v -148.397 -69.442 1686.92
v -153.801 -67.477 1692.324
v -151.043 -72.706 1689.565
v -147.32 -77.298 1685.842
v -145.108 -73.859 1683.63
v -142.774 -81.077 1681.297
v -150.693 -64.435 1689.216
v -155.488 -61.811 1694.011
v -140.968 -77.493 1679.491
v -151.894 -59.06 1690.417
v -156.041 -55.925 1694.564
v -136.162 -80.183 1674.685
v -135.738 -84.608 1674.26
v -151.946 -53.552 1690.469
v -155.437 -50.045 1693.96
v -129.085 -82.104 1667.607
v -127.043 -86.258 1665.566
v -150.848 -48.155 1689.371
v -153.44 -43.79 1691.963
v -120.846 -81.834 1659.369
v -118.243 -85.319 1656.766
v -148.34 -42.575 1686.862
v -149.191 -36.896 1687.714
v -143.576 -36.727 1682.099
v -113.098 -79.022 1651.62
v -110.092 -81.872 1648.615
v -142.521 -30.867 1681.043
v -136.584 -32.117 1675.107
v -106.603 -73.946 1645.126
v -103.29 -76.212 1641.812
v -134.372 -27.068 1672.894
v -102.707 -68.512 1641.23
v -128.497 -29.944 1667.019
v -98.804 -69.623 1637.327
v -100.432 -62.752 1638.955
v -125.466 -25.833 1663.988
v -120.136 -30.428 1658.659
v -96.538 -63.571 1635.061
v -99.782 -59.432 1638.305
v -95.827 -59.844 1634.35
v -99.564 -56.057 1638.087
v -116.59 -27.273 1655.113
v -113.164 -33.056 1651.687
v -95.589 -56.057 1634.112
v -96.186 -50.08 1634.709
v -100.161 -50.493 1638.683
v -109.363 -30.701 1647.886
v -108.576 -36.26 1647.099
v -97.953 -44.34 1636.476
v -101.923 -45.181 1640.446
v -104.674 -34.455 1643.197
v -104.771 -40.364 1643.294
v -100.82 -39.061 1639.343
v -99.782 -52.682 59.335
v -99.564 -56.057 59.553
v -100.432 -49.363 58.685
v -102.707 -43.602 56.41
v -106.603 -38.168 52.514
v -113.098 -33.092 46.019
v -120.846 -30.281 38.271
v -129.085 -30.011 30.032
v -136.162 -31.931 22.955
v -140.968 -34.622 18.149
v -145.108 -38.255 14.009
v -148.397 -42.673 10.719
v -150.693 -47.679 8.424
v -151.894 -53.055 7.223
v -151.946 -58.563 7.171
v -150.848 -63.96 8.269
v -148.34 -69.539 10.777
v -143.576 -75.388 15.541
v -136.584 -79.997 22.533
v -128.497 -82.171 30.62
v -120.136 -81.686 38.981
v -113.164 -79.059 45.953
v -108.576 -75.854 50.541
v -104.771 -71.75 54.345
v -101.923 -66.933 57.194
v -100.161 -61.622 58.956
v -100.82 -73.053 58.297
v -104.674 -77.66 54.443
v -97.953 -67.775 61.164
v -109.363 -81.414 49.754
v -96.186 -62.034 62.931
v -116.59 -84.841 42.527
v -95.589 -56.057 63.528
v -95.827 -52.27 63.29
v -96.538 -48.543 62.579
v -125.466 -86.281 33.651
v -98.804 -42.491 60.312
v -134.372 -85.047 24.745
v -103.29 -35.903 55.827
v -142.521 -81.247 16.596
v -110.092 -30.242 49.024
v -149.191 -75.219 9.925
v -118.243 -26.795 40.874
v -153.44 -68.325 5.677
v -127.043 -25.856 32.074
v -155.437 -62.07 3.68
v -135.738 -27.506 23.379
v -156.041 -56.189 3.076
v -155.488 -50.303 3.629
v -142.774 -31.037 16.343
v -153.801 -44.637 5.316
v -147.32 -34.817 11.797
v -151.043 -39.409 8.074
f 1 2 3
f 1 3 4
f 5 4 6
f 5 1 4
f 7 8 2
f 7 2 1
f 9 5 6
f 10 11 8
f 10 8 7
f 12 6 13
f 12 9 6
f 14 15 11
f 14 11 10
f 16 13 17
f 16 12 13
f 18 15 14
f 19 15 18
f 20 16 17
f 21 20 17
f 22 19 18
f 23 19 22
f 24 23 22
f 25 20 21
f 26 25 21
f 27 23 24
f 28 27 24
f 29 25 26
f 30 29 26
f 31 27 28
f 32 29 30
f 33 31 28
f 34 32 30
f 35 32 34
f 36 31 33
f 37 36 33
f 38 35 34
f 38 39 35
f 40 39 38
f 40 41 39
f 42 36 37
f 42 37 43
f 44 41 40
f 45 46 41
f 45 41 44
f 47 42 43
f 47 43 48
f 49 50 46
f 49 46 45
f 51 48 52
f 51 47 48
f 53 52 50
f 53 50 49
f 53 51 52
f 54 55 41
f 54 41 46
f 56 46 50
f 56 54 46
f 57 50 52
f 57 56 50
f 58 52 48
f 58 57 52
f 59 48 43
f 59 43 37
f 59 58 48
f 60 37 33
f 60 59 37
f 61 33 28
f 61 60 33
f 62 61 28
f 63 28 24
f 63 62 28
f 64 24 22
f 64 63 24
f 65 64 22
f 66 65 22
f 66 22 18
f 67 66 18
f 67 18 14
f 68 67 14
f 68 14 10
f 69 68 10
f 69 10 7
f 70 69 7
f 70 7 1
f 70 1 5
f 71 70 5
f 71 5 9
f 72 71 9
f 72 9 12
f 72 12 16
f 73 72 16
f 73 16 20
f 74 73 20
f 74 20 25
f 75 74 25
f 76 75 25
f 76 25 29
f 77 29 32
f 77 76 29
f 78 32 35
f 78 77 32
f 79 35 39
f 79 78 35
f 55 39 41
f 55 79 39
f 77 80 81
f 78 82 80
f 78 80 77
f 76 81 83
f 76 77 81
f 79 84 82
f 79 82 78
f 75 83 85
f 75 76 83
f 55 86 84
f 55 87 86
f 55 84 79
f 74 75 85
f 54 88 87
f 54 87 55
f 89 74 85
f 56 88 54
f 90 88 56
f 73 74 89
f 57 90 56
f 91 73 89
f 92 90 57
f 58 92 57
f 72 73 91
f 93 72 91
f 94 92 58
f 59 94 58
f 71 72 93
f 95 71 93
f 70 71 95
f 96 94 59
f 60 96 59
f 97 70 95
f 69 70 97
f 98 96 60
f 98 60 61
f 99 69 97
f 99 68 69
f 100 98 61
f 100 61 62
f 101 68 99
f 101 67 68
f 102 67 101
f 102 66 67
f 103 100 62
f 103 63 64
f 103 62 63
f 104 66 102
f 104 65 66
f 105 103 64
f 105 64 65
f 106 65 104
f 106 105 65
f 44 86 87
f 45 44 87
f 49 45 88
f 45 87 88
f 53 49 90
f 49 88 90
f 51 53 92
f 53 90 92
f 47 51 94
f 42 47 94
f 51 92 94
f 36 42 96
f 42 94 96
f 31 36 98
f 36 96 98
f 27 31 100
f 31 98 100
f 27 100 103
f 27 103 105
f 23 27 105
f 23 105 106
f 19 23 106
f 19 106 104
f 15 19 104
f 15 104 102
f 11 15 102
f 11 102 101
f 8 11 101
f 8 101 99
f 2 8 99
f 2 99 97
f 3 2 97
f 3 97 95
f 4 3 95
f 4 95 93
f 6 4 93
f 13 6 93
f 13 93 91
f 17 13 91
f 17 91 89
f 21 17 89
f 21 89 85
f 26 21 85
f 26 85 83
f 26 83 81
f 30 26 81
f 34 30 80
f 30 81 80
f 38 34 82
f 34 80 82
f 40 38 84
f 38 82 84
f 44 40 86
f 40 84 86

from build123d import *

# Parameters (mm, degrees)
F0_R     = 30.226
F0_R_2   = 26.2509
F1_DEPTH = 1695.45
F3_DEPTH = 103.124
F5_DEPTH = 124.968


with BuildPart() as f1:
    # F0 (on Top) → F1 (new body)
    with BuildSketch(Plane.XY):
        with Locations((-125.815094, -56.057207)):
            Circle(F0_R)
        with Locations((-125.815094, -56.057207)):
            Circle(F0_R_2, mode=Mode.SUBTRACT)
    extrude(amount=F1_DEPTH)

    # F2 (on Front) → F3 (cut)
    with BuildSketch(Plane.XZ):
        Polygon((-89.987062, 69.129817), (-159.116879, 0), (-88.816114, 0), align=None)
    extrude(amount=F3_DEPTH, mode=Mode.SUBTRACT)

    # F4 (on Front) → F5 (cut)
    with BuildSketch(Plane.XZ):
        Polygon((-93.407938, 1702.409625), (-163.886861, 1702.409625), (-93.407938, 1631.930702), align=None)
    extrude(amount=F5_DEPTH, mode=Mode.SUBTRACT)


solid = f1.part
